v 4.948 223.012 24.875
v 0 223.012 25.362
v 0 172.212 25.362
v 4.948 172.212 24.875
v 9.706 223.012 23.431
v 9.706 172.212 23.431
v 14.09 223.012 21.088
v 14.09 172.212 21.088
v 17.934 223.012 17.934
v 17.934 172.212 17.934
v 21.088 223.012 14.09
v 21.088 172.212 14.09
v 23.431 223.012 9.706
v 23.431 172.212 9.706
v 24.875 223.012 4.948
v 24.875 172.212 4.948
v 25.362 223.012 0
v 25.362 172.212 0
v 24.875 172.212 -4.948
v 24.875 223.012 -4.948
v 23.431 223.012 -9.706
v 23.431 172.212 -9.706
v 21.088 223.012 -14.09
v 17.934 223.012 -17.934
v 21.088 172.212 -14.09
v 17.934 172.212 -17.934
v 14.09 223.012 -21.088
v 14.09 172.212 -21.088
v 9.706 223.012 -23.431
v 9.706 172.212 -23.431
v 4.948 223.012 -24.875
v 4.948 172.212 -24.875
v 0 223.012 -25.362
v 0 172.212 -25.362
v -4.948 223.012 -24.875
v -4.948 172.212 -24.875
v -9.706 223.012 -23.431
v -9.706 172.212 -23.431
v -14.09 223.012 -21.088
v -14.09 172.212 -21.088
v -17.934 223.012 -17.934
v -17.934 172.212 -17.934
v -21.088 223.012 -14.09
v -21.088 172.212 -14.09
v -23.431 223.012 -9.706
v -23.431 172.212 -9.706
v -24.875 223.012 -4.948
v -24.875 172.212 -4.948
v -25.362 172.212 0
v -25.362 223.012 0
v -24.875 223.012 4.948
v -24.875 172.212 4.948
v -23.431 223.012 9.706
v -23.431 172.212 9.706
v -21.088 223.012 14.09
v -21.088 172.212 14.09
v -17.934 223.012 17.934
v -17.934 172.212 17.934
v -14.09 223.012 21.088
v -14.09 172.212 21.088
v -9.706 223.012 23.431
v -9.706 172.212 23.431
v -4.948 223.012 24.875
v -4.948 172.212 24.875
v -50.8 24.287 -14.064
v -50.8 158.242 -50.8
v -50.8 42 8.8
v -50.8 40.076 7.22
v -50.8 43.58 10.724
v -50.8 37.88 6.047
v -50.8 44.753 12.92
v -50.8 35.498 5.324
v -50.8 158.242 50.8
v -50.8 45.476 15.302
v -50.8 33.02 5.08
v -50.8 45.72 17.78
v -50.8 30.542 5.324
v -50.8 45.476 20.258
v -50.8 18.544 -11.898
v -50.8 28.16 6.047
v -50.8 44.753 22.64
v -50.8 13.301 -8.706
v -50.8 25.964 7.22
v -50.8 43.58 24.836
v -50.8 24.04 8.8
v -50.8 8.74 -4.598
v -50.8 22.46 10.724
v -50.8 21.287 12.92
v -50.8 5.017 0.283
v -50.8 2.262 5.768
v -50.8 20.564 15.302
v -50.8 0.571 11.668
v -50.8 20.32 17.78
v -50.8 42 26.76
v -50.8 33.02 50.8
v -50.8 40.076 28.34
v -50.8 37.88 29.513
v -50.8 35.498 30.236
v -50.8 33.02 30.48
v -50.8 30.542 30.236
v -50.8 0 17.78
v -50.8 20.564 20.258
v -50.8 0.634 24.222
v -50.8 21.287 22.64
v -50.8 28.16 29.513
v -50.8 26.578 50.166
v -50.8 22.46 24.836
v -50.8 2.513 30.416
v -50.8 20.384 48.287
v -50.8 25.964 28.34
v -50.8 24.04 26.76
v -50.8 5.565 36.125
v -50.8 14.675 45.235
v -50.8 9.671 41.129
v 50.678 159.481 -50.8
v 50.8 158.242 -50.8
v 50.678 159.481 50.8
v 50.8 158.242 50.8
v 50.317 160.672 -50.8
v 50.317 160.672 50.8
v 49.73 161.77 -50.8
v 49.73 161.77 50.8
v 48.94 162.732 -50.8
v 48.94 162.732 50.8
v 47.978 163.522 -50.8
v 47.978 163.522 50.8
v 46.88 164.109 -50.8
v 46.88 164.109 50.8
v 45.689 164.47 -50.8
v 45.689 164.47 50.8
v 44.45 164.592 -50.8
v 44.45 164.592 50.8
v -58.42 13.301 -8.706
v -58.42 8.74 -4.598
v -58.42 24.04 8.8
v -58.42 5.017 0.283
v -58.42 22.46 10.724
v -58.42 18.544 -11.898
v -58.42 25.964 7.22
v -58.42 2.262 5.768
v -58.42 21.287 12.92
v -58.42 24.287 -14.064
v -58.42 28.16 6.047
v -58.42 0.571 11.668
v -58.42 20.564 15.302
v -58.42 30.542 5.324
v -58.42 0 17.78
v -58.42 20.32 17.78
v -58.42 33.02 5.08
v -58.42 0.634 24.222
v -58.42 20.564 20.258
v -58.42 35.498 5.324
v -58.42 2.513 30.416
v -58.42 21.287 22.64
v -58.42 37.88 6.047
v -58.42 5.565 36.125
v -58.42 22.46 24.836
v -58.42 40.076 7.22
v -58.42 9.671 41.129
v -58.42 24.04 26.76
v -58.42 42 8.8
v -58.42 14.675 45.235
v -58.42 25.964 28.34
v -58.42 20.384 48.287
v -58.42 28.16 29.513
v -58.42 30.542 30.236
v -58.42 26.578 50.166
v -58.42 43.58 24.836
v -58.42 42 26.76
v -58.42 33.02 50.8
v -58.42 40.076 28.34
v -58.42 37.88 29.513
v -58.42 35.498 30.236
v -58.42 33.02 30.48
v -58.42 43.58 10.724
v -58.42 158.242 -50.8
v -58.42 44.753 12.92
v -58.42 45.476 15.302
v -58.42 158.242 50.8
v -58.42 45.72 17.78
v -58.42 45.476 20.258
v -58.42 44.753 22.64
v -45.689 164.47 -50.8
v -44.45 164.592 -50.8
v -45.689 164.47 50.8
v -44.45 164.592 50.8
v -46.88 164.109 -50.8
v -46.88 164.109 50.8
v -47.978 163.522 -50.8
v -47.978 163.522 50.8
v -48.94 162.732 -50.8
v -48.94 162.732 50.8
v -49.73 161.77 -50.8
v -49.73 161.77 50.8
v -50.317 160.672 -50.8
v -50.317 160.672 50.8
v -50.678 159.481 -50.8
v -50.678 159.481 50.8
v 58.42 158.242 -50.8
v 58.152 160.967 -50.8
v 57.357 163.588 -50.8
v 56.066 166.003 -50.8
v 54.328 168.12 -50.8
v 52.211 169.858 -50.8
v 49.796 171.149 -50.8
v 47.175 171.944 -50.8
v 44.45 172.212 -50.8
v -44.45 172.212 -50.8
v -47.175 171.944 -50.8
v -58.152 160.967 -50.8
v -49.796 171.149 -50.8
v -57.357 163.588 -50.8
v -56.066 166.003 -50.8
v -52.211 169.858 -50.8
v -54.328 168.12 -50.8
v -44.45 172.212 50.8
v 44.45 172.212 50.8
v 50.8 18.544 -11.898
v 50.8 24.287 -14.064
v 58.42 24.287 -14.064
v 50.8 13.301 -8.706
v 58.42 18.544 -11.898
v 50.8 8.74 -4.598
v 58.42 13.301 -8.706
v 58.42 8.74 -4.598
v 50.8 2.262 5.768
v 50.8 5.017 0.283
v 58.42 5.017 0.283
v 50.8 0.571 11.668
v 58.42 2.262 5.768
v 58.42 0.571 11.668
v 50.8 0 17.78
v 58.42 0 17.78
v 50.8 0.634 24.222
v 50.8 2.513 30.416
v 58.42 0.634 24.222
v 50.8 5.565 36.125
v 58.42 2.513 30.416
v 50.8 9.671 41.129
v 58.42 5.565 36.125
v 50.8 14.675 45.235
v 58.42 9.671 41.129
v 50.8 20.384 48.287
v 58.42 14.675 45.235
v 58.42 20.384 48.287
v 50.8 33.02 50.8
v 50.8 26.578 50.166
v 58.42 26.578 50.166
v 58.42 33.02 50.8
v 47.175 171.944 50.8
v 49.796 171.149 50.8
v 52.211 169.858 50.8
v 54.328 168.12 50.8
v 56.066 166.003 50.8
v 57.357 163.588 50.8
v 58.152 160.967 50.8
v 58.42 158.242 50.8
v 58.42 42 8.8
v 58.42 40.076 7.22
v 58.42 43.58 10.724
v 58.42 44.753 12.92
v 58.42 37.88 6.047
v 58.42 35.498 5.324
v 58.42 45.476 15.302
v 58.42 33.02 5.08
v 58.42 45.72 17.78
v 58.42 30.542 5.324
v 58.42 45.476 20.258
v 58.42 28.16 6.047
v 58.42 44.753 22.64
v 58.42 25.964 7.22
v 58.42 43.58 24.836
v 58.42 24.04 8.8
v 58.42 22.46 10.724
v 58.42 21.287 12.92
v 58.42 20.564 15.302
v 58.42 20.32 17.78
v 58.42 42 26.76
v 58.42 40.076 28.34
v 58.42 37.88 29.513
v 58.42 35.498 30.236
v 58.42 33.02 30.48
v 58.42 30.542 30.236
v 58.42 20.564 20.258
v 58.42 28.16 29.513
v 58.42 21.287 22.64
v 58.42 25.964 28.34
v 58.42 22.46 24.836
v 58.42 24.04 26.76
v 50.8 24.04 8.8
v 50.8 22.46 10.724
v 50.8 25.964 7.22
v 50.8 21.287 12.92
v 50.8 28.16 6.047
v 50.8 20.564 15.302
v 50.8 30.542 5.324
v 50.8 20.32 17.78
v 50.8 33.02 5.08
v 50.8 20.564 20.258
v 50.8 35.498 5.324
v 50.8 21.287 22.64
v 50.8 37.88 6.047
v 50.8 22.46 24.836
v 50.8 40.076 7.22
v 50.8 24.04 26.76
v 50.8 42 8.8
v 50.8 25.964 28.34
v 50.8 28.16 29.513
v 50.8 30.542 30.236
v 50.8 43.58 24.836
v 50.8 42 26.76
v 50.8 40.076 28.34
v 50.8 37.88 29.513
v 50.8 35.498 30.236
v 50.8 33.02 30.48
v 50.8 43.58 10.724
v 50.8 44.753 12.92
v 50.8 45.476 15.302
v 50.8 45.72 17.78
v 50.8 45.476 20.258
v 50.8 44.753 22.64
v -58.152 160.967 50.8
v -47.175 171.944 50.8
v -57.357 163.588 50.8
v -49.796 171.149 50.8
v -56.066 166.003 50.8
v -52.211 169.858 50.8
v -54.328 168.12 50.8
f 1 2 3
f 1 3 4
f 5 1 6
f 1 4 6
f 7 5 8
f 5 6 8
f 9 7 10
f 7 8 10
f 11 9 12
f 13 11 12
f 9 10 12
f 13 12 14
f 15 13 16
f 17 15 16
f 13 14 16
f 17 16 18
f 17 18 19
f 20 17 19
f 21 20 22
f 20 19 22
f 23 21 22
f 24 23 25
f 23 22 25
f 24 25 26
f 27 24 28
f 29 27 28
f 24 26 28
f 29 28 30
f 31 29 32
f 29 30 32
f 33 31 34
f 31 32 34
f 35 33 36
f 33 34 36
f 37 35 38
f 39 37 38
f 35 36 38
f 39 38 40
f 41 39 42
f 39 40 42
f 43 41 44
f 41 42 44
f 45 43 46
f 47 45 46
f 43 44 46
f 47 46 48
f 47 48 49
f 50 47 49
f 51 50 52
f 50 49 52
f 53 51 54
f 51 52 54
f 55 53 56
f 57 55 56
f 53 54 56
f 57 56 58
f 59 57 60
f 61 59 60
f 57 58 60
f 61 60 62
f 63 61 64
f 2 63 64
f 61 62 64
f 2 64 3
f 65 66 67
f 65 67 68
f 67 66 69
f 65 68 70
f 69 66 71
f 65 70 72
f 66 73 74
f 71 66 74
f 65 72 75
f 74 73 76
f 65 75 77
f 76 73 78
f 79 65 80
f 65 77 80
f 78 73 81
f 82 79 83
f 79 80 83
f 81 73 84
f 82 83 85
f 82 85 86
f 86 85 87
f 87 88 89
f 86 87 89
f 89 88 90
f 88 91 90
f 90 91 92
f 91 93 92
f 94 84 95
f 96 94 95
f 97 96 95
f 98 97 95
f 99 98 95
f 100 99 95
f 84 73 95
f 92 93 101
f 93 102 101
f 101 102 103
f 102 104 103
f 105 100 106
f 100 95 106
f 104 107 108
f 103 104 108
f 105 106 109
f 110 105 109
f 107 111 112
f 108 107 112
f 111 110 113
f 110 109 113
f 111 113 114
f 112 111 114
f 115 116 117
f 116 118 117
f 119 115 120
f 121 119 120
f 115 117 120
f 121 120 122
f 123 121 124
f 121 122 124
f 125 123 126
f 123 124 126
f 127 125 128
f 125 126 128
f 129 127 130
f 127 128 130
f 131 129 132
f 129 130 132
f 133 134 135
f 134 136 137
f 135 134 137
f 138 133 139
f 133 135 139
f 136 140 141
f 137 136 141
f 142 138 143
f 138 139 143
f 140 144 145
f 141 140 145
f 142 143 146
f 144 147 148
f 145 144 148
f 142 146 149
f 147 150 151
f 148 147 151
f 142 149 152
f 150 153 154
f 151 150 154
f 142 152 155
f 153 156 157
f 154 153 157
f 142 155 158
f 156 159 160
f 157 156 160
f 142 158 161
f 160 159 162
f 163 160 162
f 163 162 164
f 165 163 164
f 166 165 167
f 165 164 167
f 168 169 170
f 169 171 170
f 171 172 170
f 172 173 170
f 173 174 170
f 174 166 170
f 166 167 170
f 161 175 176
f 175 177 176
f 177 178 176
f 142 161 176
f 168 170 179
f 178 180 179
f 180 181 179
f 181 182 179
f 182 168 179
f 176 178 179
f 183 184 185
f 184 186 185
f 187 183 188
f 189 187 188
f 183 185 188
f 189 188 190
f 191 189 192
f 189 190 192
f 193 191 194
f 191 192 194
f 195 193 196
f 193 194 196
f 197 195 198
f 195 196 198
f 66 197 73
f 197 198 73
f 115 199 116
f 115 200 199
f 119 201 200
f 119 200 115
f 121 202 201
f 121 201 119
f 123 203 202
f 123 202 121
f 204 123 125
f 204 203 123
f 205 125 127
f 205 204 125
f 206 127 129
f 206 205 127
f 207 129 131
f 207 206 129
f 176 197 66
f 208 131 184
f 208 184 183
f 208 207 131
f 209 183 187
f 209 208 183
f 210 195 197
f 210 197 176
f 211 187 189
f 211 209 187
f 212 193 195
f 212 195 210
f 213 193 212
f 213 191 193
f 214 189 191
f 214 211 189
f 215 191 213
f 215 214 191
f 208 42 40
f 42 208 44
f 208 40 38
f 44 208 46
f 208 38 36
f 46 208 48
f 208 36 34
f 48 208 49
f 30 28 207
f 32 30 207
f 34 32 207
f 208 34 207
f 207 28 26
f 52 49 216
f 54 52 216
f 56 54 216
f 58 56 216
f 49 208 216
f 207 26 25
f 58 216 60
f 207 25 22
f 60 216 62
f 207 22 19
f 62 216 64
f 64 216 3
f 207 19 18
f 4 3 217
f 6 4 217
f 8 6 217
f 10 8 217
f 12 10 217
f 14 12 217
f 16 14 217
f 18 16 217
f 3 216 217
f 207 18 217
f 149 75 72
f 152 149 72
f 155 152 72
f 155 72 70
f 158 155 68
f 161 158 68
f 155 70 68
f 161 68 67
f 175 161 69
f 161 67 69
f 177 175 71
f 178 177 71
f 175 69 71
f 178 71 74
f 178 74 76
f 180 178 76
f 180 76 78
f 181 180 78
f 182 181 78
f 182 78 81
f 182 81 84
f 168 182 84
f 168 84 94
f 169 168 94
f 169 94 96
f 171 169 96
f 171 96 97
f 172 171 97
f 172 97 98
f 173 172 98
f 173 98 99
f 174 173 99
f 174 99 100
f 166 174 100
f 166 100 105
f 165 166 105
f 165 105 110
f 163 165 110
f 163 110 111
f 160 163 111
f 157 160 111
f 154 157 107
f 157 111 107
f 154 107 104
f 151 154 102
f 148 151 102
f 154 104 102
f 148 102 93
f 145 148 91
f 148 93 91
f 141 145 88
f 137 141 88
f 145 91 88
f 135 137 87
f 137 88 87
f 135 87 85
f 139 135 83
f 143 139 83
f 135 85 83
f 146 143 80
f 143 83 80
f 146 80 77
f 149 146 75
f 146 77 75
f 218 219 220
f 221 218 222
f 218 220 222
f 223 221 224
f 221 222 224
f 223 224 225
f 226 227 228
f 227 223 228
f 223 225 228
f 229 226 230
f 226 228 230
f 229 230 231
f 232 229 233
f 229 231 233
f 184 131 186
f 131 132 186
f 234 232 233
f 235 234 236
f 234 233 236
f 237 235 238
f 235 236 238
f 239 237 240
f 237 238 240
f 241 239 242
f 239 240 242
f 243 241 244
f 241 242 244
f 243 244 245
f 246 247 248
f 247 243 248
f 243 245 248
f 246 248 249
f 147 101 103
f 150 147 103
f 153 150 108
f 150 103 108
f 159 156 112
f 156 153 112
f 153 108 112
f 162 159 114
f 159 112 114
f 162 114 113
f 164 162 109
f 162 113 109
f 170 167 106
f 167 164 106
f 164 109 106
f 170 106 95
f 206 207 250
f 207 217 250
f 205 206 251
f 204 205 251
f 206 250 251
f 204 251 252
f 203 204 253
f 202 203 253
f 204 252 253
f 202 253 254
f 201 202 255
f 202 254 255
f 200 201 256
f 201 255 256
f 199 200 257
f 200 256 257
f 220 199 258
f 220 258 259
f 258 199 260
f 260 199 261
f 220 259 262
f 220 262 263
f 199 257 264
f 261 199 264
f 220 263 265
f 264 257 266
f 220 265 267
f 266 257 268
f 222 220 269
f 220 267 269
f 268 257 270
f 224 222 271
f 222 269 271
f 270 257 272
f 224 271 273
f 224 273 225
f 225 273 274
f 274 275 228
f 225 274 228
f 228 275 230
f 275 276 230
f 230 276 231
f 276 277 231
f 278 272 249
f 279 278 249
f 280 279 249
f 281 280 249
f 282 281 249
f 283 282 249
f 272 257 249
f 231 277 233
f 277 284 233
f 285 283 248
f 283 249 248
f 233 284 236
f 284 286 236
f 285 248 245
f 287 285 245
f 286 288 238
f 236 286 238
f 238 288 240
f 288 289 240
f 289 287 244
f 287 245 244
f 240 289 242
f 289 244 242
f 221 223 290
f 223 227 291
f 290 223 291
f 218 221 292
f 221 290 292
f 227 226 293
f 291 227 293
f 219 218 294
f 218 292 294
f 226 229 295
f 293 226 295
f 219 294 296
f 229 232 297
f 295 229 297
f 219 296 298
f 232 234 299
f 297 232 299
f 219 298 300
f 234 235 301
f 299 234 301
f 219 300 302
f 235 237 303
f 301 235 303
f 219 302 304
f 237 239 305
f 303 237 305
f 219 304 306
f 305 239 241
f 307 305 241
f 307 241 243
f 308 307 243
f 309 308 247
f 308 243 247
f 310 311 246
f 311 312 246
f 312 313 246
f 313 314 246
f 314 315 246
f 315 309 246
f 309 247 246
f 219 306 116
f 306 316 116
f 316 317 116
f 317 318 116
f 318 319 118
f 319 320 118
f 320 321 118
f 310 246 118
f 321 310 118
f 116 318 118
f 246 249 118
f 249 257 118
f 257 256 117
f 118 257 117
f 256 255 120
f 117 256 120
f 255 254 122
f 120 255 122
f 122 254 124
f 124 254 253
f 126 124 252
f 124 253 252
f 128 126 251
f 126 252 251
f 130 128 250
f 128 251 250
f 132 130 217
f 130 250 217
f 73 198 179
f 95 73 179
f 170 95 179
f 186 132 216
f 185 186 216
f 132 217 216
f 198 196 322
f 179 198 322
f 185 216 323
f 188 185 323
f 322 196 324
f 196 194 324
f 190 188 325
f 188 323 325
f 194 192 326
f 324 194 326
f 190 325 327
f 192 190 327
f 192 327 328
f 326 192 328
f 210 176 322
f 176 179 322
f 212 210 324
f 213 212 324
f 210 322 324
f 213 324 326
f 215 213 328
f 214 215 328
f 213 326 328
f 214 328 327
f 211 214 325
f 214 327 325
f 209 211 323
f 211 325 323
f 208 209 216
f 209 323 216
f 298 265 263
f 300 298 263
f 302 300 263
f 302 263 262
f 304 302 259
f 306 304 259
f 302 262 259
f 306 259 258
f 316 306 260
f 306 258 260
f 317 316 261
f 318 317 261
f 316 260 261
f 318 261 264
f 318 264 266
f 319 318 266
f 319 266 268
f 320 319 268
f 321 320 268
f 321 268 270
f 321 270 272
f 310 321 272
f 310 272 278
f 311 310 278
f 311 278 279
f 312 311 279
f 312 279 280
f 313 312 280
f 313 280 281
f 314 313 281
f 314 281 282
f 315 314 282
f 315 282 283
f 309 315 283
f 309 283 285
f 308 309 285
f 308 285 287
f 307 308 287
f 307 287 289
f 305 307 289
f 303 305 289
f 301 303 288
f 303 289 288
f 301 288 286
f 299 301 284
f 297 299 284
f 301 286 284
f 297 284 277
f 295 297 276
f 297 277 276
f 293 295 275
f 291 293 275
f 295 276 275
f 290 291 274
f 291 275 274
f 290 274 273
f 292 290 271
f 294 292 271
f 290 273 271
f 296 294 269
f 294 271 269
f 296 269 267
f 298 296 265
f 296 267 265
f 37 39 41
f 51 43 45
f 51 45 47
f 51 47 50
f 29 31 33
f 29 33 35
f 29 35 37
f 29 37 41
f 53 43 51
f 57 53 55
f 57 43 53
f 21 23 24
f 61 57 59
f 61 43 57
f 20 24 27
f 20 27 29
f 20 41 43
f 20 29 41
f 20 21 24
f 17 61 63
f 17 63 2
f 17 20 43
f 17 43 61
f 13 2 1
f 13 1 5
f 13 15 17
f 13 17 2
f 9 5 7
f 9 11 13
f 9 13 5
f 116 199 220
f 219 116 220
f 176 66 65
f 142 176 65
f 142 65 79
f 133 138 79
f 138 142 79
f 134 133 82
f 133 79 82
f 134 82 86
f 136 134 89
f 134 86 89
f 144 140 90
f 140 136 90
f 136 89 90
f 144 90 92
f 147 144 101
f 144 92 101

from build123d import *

# Parameters (mm, degrees)
BASE_FLANGE1_DEPTH  = 50.8
SKETCH8_R           = 12.7
CUT_EXTRUDE2_DEPTH  = 215.217642934
SKETCH9_R           = 25.36182522
BOSS_EXTRUDE1_DEPTH = 50.8


# Sheet-metal steps are written as plain solids
with BuildPart() as part:
    # Sketch2 → Base-Flange1 (new, symmetric)
    with BuildSketch(Plane.XY):
        with BuildLine():
            Line((50.8, 0), (50.8, 158.242))
            ThreePointArc((50.8, 158.242), (48.940128061, 162.732128061), (44.45, 164.592))
            Line((44.45, 164.592), (-44.45, 164.592))
            ThreePointArc((-44.45, 164.592), (-48.940128061, 162.732128061), (-50.8, 158.242))
            Line((-50.8, 158.242), (-50.8, 0))
            Line((-50.8, 0), (-58.42, 0))
            Line((-58.42, 0), (-58.42, 158.242))
            ThreePointArc((-58.42, 158.242), (-54.328281733, 168.120281733), (-44.45, 172.212))
            Line((-44.45, 172.212), (44.45, 172.212))
            ThreePointArc((44.45, 172.212), (54.328281733, 168.120281733), (58.42, 158.242))
            Line((58.42, 158.242), (58.42, 0))
            Line((58.42, 0), (50.8, 0))
        make_face()
    extrude(amount=BASE_FLANGE1_DEPTH, both=True)

    # Sketch8 → Cut-Extrude2 (cut, through all)
    with BuildSketch(Plane(origin=(58.42, 0, 0), x_dir=(0, 0, -1), z_dir=(1, 0, 0))):
        with BuildLine():
            Line((50.8, 0), (50.8, 158.242))
            Line((50.8, 158.242), (14.064244739, 24.287046492))
            ThreePointArc((14.064244739, 24.287046492), (2.244463478, 6.764690776), (-17.78, 0))
            Line((-17.78, 0), (50.8, 0))
        make_face()
        with BuildLine():
            Line((-50.8, 0), (-17.78, 0))
            ThreePointArc((-17.78, 0), (-41.128665915, 9.671334085), (-50.8, 33.02))
            Line((-50.8, 33.02), (-50.8, 0))
        make_face()
        with Locations((-17.78, 33.02)):
            Circle(SKETCH8_R)
    extrude(amount=-CUT_EXTRUDE2_DEPTH, mode=Mode.SUBTRACT)

    # Sketch9 → Boss-Extrude1 (add)
    with BuildSketch(Plane(origin=(0, 172.212, 0), x_dir=(1, 0, 0), z_dir=(0, 1, 0))):
        with Locations(Location((0, 0, 0), (0, 0, 270))):
            Circle(SKETCH9_R)
    extrude(amount=BOSS_EXTRUDE1_DEPTH)


solid = part.part
